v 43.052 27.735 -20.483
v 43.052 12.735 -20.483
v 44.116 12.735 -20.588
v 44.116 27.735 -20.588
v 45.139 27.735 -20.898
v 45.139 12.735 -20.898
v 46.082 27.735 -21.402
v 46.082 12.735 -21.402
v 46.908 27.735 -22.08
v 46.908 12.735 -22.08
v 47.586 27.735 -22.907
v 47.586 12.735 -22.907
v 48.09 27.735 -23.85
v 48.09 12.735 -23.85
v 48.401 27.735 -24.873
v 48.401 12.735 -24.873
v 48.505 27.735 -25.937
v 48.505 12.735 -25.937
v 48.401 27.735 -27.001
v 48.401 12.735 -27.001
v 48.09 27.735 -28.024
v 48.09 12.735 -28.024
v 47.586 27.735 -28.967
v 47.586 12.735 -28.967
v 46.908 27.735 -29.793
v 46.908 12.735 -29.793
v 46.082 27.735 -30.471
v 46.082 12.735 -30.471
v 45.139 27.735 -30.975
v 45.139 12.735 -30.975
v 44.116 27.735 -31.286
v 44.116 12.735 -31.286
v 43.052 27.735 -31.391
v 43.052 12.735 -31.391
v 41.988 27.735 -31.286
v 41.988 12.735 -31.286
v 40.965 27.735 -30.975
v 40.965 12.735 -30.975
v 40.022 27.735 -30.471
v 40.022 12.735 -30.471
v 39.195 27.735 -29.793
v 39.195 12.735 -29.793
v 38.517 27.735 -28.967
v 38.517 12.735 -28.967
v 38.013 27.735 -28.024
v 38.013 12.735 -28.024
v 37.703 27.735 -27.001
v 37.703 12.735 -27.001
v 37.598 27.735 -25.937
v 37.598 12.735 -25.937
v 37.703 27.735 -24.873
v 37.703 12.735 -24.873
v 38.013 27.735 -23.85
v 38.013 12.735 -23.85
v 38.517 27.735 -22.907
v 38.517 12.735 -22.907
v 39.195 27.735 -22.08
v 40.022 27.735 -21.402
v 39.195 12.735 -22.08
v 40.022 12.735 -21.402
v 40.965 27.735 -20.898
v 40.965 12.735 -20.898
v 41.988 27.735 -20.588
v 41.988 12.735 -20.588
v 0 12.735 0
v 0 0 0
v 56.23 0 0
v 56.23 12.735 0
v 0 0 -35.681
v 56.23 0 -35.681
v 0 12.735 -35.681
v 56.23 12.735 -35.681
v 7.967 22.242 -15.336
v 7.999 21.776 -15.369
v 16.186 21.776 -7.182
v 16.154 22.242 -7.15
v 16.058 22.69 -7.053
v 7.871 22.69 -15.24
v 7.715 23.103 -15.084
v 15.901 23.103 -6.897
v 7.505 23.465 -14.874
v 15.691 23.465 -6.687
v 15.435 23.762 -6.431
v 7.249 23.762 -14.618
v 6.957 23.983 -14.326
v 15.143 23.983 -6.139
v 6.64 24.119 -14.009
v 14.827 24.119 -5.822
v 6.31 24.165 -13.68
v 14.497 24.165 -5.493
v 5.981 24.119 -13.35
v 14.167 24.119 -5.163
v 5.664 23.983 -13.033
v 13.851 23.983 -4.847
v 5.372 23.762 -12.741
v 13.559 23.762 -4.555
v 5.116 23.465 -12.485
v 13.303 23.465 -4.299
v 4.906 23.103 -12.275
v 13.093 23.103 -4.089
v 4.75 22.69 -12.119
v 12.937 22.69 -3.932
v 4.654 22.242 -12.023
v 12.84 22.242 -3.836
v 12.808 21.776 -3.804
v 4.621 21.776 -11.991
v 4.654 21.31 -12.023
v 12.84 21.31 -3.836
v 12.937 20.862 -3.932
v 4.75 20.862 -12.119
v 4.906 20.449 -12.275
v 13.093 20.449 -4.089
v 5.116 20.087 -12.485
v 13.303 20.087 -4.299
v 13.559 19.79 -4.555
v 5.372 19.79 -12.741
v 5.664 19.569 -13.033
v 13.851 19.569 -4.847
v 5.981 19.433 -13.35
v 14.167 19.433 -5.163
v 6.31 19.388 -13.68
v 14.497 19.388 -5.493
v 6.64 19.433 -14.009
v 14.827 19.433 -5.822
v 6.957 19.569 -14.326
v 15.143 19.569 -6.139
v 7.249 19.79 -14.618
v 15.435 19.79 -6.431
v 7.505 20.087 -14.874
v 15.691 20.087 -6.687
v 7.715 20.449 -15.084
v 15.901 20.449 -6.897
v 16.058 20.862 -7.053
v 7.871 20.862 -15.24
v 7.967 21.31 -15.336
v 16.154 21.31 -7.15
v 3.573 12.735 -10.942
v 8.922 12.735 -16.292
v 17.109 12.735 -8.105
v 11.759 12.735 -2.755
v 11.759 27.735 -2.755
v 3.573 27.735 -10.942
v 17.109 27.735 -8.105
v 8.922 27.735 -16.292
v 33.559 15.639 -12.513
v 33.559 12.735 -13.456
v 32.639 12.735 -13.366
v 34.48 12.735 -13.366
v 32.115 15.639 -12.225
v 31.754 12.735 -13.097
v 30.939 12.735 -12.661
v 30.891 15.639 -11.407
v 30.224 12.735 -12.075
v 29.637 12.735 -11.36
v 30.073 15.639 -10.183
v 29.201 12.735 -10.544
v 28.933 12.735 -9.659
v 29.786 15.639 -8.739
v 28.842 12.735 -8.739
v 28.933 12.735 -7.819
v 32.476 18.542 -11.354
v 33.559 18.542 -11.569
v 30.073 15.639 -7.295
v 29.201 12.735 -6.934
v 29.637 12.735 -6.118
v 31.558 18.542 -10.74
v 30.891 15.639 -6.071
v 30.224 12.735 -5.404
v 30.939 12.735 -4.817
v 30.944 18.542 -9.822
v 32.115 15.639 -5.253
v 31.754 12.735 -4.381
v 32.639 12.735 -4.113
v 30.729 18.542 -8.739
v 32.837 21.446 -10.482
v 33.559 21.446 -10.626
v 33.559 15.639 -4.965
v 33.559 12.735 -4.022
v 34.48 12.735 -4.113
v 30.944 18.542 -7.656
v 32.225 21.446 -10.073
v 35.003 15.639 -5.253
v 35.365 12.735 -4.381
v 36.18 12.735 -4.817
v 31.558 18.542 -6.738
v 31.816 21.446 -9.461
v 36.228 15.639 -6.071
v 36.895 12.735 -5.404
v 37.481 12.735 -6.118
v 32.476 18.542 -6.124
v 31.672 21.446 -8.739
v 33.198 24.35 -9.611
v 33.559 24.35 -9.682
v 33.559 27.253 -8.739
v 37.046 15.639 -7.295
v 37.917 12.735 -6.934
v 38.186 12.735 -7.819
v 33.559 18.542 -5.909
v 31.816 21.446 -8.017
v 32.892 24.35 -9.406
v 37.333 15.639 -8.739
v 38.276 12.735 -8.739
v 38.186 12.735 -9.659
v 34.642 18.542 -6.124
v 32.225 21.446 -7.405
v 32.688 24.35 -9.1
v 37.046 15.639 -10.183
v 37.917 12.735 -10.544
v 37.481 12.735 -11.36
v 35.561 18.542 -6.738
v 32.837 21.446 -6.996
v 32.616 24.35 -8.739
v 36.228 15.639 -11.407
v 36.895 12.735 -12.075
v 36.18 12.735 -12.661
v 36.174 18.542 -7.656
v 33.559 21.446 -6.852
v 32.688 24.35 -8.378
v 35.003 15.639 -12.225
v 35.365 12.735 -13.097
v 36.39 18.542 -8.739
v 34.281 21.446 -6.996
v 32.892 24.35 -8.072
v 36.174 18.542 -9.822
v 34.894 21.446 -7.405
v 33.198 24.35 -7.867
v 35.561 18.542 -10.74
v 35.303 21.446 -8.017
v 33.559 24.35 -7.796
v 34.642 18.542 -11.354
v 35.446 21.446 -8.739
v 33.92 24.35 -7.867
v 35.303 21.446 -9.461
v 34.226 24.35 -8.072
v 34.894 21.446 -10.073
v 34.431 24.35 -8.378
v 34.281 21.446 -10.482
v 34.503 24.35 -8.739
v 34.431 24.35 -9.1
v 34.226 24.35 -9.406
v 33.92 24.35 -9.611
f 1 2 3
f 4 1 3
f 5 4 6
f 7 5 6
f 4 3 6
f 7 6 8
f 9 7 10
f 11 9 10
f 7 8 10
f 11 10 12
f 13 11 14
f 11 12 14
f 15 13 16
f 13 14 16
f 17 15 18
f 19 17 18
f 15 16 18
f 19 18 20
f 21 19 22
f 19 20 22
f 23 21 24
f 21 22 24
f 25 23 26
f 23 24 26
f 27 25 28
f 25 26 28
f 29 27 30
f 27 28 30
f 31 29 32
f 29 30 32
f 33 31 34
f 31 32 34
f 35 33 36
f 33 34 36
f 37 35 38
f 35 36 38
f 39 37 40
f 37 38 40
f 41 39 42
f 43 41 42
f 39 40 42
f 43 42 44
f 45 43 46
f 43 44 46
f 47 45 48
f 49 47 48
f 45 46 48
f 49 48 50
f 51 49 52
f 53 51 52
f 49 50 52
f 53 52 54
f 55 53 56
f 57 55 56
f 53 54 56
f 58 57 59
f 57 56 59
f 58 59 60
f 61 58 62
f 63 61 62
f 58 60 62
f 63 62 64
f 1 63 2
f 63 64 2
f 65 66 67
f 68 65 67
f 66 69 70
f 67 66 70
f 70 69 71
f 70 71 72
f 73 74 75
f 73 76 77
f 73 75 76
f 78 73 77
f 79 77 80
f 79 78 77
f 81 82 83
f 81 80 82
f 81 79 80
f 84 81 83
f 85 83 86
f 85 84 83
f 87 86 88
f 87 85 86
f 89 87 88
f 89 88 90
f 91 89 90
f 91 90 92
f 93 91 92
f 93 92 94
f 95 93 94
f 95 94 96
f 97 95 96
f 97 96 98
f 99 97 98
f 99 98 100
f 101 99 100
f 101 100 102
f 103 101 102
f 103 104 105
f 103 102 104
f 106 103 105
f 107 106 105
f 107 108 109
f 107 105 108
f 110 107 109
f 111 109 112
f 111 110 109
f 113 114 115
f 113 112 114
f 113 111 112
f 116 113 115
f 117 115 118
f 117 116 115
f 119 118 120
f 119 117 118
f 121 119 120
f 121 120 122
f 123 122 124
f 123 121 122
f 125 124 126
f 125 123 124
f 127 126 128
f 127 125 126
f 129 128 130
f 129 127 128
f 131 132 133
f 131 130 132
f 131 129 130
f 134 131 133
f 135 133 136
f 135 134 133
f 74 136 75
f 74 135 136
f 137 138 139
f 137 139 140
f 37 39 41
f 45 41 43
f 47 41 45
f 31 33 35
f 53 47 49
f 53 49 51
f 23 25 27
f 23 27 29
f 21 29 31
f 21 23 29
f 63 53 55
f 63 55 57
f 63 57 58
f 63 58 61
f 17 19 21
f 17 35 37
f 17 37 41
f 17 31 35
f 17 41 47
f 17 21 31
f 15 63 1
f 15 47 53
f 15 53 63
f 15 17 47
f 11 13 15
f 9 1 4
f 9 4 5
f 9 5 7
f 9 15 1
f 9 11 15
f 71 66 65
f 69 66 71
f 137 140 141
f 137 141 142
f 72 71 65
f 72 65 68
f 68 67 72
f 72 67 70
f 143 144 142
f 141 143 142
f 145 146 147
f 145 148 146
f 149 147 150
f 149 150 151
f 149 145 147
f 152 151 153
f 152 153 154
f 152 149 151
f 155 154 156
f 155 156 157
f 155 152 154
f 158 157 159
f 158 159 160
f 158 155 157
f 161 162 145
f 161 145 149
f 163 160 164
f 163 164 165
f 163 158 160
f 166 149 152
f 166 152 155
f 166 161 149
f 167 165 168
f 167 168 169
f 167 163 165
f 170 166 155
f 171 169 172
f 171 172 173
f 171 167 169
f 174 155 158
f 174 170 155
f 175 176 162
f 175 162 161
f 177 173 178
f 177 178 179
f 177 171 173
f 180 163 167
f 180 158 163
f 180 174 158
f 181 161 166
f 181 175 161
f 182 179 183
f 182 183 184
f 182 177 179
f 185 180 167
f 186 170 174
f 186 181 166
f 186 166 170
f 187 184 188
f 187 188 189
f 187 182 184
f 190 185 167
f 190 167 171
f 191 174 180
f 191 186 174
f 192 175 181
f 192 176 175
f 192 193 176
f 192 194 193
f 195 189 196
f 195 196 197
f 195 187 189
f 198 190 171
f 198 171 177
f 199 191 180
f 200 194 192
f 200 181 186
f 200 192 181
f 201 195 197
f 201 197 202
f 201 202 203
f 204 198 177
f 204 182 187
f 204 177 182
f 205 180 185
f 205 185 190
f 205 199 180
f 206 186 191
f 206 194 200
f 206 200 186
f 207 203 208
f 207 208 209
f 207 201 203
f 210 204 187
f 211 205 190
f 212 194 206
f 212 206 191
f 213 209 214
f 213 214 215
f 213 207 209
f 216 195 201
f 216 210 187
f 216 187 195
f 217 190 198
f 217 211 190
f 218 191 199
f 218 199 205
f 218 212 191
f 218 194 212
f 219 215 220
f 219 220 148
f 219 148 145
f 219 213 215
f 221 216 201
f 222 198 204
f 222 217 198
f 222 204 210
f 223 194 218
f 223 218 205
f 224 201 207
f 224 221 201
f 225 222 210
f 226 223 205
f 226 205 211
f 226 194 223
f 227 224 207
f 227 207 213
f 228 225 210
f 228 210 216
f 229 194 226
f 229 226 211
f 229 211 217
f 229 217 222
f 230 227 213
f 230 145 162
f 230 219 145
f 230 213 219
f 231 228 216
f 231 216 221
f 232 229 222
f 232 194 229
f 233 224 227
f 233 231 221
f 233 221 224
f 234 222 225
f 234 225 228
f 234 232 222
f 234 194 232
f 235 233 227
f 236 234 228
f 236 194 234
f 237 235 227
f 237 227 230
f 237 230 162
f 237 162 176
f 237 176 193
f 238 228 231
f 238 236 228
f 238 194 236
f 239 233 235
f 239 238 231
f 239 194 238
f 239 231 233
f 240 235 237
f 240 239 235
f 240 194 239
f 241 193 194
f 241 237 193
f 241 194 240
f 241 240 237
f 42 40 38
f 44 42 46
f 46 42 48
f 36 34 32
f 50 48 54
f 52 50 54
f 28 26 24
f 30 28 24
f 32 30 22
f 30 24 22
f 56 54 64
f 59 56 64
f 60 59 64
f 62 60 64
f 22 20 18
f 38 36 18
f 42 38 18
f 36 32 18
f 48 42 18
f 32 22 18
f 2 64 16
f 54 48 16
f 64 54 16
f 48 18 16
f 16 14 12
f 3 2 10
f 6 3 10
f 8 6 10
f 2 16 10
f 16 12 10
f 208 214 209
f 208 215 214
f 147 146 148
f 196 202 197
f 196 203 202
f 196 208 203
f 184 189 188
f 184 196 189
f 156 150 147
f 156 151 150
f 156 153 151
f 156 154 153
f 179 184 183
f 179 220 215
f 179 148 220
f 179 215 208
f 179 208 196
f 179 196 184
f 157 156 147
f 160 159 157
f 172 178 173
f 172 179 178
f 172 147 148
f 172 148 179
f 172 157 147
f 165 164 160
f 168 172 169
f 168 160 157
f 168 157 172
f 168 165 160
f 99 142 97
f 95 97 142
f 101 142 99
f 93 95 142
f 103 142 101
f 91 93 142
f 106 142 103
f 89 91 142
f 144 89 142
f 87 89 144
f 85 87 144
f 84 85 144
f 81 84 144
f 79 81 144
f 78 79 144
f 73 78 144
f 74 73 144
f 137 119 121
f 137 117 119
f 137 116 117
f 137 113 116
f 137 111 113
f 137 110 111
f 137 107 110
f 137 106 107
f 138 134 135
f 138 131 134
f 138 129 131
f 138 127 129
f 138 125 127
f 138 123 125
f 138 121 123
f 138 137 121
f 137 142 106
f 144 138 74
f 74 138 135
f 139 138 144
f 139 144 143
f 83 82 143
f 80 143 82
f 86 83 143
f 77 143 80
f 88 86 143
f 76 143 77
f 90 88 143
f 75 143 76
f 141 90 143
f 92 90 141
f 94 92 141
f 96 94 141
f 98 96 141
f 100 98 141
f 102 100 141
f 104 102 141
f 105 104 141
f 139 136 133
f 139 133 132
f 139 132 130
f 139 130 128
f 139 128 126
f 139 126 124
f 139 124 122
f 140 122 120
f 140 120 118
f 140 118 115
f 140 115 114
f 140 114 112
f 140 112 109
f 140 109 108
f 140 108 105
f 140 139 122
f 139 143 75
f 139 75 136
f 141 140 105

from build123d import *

# Parameters (mm, degrees)
SCHIZZO1_W                    = 56.23046985
SCHIZZO1_H                    = 35.680874005
ESTRUSIONE_ESTRUSIONE1_DEPTH  = 12.735315729
ESTRUSIONE_ESTRUSIONE2_DEPTH  = 15
SCHIZZO3_R                    = 5.453750666
ESTRUSIONE_ESTRUSIONE3_DEPTH  = 15
TAGLIO_ESTRUSIONE1_DEPTH      = 72.131882913
TAGLIO_ESTRUSIONE1_DEPTH_BACK = 72.131882913
SCHIZZO5_R                    = 2.388711944


with BuildPart() as part:
    # Schizzo1 → Estrusione-Estrusione1 (new body)
    with BuildSketch(Plane(origin=(0, 0, 0), x_dir=(1, 0, 0), z_dir=(0, 1, 0))):
        with Locations((28.115234925, 17.840437002)):
            Rectangle(SCHIZZO1_W, SCHIZZO1_H)
    extrude(amount=ESTRUSIONE_ESTRUSIONE1_DEPTH)


with BuildPart() as body_2:
    # Schizzo2 → Estrusione-Estrusione2 (new body)
    with BuildSketch(Plane(origin=(0, 12.735315729, 0), x_dir=(1, 0, 0), z_dir=(0, 1, 0))):
        Polygon((3.572563991, 10.94212636), (8.922368061, 16.29193043), (17.109189441, 8.10510905), (11.759385371, 2.75530498), align=None)
    extrude(amount=ESTRUSIONE_ESTRUSIONE2_DEPTH)

    # Schizzo5 → Taglio-Estrusione1 (cut, two sides: drawn at the far end of the back side and taken through both)
    with BuildSketch(Plane(origin=(4.502040195, 0, 4.502040195), x_dir=(0.7071067811865465, 0, -0.7071067811865487), z_dir=(0.7071067811865487, 0, 0.7071067811865465)).offset(-TAGLIO_ESTRUSIONE1_DEPTH_BACK)):
        with Locations((14.135013801, 21.77630268)):
            Circle(SCHIZZO5_R)
    extrude(amount=TAGLIO_ESTRUSIONE1_DEPTH + TAGLIO_ESTRUSIONE1_DEPTH_BACK, mode=Mode.SUBTRACT)


with BuildPart() as body_3:
    # Schizzo3 → Estrusione-Estrusione3 (new body)
    with BuildSketch(Plane(origin=(0, 12.735315729, 0), x_dir=(1, 0, 0), z_dir=(0, 1, 0))):
        with Locations(Location((43.051598553, 25.936783642, 0), (0, 0, 270))):
            Circle(SCHIZZO3_R)
    extrude(amount=ESTRUSIONE_ESTRUSIONE3_DEPTH)


with BuildPart() as body_4:
    # Estrusione-Estrusione4 cone 1 section (through the dimple's axis) → Estrusione-Estrusione4 (revolve)
    with BuildSketch(Plane(origin=(33.559330079, 12.735315729, -8.739026642), x_dir=(0, 0, -1), z_dir=(1, 0, 0))):
        Polygon((0, 0), (4.717141892, 0), (0, 14.517869944), align=None)
    revolve(axis=Axis((33.559330079, 12.735315729, -8.739026642), (0, 1, 0)))


solid = Compound([part.part, body_2.part, body_3.part, body_4.part])
